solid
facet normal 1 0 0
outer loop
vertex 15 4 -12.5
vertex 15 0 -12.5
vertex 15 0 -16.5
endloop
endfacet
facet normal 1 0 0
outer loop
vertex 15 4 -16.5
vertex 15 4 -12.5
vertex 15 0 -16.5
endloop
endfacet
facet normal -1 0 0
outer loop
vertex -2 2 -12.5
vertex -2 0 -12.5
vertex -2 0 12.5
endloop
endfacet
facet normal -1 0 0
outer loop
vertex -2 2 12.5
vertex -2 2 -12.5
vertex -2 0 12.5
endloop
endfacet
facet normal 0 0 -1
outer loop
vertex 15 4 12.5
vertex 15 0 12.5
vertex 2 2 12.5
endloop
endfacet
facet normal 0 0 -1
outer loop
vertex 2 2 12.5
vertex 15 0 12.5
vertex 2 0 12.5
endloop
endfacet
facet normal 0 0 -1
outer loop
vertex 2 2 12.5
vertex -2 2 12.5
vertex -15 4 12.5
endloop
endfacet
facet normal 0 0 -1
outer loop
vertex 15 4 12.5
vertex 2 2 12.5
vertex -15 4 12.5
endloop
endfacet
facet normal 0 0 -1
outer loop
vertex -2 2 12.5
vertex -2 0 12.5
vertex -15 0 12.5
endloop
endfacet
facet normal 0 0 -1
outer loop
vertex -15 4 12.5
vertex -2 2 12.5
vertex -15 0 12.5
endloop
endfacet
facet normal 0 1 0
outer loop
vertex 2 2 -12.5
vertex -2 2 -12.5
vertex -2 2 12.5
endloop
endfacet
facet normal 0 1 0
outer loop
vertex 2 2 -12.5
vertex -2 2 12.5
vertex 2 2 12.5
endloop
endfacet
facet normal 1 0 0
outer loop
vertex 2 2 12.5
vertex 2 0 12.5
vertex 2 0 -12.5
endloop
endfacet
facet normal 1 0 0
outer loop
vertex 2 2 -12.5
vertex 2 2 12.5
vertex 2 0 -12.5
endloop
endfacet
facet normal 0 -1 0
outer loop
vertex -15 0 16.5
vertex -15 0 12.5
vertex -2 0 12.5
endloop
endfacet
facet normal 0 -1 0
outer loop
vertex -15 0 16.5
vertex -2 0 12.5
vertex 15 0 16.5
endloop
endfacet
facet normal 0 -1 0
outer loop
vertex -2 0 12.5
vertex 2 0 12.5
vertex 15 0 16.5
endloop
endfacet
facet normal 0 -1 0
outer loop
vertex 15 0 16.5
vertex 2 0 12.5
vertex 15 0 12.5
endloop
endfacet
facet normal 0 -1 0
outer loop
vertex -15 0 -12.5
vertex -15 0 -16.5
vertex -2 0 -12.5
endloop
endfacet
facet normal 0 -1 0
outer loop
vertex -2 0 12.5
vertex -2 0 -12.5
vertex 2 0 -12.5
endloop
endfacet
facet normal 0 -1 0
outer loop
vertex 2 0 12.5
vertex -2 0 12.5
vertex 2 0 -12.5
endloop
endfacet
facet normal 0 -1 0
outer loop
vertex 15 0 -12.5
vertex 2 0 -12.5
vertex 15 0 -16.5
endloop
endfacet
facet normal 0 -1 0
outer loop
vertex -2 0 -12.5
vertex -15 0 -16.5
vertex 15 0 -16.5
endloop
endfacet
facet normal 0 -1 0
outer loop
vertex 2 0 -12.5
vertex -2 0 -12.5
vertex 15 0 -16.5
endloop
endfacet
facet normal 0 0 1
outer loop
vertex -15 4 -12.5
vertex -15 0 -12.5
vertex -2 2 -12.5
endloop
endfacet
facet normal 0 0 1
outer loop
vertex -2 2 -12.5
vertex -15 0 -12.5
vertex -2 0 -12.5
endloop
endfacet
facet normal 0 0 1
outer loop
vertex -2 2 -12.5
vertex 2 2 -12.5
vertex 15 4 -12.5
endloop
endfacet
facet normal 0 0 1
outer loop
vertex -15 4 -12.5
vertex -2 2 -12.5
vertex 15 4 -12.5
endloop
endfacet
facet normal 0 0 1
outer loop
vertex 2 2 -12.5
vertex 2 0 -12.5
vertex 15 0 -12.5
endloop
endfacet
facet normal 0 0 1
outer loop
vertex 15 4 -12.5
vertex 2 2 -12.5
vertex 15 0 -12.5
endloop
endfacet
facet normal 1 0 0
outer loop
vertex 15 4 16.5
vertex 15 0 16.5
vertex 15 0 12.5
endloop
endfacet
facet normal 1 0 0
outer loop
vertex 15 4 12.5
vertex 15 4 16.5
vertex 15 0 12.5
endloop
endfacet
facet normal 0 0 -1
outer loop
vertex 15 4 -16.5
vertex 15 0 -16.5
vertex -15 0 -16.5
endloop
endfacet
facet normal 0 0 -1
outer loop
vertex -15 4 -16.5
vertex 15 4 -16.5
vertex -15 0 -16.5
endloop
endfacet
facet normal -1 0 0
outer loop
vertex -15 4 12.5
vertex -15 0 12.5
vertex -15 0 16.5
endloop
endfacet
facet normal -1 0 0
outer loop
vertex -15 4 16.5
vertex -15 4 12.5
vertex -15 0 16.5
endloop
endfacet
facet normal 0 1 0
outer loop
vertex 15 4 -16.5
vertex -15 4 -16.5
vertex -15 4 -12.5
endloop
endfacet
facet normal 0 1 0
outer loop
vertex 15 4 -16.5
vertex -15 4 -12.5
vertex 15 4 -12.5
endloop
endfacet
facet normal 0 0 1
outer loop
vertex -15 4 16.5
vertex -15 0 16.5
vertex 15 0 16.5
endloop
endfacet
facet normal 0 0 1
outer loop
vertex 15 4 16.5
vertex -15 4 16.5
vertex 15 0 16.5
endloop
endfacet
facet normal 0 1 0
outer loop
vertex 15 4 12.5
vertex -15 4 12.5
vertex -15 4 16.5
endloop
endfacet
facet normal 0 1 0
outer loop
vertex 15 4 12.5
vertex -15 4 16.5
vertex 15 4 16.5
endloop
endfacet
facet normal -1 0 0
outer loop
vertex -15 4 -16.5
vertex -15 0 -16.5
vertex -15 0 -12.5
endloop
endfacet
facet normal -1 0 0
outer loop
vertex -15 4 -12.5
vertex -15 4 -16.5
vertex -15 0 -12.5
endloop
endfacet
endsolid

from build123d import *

# Parameters (mm, degrees)
BOSS_EXTRUDE1_DEPTH = 4
SKETCH2_W           = 4
SKETCH2_H           = 25
CUT_EXTRUDE1_DEPTH  = 2


with BuildPart() as part:
    # Sketch1 → Boss-Extrude1 (new body)
    with BuildSketch(Plane(origin=(0, 0, 0), x_dir=(1, 0, 0), z_dir=(0, 1, 0))):
        Polygon((-15, 12.5), (-2, 12.5), (-2, -12.5), (-15, -12.5), (-15, -16.5), (15, -16.5), (15, -12.5), (2, -12.5), (2, 12.5), (15, 12.5), (15, 16.5), (-15, 16.5), align=None)
    extrude(amount=BOSS_EXTRUDE1_DEPTH)

    # Sketch2 → Cut-Extrude1 (cut)
    with BuildSketch(Plane(origin=(0, 4, 0), x_dir=(1, 0, 0), z_dir=(0, 1, 0))):
        Rectangle(SKETCH2_W, SKETCH2_H)
    extrude(amount=-CUT_EXTRUDE1_DEPTH, mode=Mode.SUBTRACT)


solid = part.part
